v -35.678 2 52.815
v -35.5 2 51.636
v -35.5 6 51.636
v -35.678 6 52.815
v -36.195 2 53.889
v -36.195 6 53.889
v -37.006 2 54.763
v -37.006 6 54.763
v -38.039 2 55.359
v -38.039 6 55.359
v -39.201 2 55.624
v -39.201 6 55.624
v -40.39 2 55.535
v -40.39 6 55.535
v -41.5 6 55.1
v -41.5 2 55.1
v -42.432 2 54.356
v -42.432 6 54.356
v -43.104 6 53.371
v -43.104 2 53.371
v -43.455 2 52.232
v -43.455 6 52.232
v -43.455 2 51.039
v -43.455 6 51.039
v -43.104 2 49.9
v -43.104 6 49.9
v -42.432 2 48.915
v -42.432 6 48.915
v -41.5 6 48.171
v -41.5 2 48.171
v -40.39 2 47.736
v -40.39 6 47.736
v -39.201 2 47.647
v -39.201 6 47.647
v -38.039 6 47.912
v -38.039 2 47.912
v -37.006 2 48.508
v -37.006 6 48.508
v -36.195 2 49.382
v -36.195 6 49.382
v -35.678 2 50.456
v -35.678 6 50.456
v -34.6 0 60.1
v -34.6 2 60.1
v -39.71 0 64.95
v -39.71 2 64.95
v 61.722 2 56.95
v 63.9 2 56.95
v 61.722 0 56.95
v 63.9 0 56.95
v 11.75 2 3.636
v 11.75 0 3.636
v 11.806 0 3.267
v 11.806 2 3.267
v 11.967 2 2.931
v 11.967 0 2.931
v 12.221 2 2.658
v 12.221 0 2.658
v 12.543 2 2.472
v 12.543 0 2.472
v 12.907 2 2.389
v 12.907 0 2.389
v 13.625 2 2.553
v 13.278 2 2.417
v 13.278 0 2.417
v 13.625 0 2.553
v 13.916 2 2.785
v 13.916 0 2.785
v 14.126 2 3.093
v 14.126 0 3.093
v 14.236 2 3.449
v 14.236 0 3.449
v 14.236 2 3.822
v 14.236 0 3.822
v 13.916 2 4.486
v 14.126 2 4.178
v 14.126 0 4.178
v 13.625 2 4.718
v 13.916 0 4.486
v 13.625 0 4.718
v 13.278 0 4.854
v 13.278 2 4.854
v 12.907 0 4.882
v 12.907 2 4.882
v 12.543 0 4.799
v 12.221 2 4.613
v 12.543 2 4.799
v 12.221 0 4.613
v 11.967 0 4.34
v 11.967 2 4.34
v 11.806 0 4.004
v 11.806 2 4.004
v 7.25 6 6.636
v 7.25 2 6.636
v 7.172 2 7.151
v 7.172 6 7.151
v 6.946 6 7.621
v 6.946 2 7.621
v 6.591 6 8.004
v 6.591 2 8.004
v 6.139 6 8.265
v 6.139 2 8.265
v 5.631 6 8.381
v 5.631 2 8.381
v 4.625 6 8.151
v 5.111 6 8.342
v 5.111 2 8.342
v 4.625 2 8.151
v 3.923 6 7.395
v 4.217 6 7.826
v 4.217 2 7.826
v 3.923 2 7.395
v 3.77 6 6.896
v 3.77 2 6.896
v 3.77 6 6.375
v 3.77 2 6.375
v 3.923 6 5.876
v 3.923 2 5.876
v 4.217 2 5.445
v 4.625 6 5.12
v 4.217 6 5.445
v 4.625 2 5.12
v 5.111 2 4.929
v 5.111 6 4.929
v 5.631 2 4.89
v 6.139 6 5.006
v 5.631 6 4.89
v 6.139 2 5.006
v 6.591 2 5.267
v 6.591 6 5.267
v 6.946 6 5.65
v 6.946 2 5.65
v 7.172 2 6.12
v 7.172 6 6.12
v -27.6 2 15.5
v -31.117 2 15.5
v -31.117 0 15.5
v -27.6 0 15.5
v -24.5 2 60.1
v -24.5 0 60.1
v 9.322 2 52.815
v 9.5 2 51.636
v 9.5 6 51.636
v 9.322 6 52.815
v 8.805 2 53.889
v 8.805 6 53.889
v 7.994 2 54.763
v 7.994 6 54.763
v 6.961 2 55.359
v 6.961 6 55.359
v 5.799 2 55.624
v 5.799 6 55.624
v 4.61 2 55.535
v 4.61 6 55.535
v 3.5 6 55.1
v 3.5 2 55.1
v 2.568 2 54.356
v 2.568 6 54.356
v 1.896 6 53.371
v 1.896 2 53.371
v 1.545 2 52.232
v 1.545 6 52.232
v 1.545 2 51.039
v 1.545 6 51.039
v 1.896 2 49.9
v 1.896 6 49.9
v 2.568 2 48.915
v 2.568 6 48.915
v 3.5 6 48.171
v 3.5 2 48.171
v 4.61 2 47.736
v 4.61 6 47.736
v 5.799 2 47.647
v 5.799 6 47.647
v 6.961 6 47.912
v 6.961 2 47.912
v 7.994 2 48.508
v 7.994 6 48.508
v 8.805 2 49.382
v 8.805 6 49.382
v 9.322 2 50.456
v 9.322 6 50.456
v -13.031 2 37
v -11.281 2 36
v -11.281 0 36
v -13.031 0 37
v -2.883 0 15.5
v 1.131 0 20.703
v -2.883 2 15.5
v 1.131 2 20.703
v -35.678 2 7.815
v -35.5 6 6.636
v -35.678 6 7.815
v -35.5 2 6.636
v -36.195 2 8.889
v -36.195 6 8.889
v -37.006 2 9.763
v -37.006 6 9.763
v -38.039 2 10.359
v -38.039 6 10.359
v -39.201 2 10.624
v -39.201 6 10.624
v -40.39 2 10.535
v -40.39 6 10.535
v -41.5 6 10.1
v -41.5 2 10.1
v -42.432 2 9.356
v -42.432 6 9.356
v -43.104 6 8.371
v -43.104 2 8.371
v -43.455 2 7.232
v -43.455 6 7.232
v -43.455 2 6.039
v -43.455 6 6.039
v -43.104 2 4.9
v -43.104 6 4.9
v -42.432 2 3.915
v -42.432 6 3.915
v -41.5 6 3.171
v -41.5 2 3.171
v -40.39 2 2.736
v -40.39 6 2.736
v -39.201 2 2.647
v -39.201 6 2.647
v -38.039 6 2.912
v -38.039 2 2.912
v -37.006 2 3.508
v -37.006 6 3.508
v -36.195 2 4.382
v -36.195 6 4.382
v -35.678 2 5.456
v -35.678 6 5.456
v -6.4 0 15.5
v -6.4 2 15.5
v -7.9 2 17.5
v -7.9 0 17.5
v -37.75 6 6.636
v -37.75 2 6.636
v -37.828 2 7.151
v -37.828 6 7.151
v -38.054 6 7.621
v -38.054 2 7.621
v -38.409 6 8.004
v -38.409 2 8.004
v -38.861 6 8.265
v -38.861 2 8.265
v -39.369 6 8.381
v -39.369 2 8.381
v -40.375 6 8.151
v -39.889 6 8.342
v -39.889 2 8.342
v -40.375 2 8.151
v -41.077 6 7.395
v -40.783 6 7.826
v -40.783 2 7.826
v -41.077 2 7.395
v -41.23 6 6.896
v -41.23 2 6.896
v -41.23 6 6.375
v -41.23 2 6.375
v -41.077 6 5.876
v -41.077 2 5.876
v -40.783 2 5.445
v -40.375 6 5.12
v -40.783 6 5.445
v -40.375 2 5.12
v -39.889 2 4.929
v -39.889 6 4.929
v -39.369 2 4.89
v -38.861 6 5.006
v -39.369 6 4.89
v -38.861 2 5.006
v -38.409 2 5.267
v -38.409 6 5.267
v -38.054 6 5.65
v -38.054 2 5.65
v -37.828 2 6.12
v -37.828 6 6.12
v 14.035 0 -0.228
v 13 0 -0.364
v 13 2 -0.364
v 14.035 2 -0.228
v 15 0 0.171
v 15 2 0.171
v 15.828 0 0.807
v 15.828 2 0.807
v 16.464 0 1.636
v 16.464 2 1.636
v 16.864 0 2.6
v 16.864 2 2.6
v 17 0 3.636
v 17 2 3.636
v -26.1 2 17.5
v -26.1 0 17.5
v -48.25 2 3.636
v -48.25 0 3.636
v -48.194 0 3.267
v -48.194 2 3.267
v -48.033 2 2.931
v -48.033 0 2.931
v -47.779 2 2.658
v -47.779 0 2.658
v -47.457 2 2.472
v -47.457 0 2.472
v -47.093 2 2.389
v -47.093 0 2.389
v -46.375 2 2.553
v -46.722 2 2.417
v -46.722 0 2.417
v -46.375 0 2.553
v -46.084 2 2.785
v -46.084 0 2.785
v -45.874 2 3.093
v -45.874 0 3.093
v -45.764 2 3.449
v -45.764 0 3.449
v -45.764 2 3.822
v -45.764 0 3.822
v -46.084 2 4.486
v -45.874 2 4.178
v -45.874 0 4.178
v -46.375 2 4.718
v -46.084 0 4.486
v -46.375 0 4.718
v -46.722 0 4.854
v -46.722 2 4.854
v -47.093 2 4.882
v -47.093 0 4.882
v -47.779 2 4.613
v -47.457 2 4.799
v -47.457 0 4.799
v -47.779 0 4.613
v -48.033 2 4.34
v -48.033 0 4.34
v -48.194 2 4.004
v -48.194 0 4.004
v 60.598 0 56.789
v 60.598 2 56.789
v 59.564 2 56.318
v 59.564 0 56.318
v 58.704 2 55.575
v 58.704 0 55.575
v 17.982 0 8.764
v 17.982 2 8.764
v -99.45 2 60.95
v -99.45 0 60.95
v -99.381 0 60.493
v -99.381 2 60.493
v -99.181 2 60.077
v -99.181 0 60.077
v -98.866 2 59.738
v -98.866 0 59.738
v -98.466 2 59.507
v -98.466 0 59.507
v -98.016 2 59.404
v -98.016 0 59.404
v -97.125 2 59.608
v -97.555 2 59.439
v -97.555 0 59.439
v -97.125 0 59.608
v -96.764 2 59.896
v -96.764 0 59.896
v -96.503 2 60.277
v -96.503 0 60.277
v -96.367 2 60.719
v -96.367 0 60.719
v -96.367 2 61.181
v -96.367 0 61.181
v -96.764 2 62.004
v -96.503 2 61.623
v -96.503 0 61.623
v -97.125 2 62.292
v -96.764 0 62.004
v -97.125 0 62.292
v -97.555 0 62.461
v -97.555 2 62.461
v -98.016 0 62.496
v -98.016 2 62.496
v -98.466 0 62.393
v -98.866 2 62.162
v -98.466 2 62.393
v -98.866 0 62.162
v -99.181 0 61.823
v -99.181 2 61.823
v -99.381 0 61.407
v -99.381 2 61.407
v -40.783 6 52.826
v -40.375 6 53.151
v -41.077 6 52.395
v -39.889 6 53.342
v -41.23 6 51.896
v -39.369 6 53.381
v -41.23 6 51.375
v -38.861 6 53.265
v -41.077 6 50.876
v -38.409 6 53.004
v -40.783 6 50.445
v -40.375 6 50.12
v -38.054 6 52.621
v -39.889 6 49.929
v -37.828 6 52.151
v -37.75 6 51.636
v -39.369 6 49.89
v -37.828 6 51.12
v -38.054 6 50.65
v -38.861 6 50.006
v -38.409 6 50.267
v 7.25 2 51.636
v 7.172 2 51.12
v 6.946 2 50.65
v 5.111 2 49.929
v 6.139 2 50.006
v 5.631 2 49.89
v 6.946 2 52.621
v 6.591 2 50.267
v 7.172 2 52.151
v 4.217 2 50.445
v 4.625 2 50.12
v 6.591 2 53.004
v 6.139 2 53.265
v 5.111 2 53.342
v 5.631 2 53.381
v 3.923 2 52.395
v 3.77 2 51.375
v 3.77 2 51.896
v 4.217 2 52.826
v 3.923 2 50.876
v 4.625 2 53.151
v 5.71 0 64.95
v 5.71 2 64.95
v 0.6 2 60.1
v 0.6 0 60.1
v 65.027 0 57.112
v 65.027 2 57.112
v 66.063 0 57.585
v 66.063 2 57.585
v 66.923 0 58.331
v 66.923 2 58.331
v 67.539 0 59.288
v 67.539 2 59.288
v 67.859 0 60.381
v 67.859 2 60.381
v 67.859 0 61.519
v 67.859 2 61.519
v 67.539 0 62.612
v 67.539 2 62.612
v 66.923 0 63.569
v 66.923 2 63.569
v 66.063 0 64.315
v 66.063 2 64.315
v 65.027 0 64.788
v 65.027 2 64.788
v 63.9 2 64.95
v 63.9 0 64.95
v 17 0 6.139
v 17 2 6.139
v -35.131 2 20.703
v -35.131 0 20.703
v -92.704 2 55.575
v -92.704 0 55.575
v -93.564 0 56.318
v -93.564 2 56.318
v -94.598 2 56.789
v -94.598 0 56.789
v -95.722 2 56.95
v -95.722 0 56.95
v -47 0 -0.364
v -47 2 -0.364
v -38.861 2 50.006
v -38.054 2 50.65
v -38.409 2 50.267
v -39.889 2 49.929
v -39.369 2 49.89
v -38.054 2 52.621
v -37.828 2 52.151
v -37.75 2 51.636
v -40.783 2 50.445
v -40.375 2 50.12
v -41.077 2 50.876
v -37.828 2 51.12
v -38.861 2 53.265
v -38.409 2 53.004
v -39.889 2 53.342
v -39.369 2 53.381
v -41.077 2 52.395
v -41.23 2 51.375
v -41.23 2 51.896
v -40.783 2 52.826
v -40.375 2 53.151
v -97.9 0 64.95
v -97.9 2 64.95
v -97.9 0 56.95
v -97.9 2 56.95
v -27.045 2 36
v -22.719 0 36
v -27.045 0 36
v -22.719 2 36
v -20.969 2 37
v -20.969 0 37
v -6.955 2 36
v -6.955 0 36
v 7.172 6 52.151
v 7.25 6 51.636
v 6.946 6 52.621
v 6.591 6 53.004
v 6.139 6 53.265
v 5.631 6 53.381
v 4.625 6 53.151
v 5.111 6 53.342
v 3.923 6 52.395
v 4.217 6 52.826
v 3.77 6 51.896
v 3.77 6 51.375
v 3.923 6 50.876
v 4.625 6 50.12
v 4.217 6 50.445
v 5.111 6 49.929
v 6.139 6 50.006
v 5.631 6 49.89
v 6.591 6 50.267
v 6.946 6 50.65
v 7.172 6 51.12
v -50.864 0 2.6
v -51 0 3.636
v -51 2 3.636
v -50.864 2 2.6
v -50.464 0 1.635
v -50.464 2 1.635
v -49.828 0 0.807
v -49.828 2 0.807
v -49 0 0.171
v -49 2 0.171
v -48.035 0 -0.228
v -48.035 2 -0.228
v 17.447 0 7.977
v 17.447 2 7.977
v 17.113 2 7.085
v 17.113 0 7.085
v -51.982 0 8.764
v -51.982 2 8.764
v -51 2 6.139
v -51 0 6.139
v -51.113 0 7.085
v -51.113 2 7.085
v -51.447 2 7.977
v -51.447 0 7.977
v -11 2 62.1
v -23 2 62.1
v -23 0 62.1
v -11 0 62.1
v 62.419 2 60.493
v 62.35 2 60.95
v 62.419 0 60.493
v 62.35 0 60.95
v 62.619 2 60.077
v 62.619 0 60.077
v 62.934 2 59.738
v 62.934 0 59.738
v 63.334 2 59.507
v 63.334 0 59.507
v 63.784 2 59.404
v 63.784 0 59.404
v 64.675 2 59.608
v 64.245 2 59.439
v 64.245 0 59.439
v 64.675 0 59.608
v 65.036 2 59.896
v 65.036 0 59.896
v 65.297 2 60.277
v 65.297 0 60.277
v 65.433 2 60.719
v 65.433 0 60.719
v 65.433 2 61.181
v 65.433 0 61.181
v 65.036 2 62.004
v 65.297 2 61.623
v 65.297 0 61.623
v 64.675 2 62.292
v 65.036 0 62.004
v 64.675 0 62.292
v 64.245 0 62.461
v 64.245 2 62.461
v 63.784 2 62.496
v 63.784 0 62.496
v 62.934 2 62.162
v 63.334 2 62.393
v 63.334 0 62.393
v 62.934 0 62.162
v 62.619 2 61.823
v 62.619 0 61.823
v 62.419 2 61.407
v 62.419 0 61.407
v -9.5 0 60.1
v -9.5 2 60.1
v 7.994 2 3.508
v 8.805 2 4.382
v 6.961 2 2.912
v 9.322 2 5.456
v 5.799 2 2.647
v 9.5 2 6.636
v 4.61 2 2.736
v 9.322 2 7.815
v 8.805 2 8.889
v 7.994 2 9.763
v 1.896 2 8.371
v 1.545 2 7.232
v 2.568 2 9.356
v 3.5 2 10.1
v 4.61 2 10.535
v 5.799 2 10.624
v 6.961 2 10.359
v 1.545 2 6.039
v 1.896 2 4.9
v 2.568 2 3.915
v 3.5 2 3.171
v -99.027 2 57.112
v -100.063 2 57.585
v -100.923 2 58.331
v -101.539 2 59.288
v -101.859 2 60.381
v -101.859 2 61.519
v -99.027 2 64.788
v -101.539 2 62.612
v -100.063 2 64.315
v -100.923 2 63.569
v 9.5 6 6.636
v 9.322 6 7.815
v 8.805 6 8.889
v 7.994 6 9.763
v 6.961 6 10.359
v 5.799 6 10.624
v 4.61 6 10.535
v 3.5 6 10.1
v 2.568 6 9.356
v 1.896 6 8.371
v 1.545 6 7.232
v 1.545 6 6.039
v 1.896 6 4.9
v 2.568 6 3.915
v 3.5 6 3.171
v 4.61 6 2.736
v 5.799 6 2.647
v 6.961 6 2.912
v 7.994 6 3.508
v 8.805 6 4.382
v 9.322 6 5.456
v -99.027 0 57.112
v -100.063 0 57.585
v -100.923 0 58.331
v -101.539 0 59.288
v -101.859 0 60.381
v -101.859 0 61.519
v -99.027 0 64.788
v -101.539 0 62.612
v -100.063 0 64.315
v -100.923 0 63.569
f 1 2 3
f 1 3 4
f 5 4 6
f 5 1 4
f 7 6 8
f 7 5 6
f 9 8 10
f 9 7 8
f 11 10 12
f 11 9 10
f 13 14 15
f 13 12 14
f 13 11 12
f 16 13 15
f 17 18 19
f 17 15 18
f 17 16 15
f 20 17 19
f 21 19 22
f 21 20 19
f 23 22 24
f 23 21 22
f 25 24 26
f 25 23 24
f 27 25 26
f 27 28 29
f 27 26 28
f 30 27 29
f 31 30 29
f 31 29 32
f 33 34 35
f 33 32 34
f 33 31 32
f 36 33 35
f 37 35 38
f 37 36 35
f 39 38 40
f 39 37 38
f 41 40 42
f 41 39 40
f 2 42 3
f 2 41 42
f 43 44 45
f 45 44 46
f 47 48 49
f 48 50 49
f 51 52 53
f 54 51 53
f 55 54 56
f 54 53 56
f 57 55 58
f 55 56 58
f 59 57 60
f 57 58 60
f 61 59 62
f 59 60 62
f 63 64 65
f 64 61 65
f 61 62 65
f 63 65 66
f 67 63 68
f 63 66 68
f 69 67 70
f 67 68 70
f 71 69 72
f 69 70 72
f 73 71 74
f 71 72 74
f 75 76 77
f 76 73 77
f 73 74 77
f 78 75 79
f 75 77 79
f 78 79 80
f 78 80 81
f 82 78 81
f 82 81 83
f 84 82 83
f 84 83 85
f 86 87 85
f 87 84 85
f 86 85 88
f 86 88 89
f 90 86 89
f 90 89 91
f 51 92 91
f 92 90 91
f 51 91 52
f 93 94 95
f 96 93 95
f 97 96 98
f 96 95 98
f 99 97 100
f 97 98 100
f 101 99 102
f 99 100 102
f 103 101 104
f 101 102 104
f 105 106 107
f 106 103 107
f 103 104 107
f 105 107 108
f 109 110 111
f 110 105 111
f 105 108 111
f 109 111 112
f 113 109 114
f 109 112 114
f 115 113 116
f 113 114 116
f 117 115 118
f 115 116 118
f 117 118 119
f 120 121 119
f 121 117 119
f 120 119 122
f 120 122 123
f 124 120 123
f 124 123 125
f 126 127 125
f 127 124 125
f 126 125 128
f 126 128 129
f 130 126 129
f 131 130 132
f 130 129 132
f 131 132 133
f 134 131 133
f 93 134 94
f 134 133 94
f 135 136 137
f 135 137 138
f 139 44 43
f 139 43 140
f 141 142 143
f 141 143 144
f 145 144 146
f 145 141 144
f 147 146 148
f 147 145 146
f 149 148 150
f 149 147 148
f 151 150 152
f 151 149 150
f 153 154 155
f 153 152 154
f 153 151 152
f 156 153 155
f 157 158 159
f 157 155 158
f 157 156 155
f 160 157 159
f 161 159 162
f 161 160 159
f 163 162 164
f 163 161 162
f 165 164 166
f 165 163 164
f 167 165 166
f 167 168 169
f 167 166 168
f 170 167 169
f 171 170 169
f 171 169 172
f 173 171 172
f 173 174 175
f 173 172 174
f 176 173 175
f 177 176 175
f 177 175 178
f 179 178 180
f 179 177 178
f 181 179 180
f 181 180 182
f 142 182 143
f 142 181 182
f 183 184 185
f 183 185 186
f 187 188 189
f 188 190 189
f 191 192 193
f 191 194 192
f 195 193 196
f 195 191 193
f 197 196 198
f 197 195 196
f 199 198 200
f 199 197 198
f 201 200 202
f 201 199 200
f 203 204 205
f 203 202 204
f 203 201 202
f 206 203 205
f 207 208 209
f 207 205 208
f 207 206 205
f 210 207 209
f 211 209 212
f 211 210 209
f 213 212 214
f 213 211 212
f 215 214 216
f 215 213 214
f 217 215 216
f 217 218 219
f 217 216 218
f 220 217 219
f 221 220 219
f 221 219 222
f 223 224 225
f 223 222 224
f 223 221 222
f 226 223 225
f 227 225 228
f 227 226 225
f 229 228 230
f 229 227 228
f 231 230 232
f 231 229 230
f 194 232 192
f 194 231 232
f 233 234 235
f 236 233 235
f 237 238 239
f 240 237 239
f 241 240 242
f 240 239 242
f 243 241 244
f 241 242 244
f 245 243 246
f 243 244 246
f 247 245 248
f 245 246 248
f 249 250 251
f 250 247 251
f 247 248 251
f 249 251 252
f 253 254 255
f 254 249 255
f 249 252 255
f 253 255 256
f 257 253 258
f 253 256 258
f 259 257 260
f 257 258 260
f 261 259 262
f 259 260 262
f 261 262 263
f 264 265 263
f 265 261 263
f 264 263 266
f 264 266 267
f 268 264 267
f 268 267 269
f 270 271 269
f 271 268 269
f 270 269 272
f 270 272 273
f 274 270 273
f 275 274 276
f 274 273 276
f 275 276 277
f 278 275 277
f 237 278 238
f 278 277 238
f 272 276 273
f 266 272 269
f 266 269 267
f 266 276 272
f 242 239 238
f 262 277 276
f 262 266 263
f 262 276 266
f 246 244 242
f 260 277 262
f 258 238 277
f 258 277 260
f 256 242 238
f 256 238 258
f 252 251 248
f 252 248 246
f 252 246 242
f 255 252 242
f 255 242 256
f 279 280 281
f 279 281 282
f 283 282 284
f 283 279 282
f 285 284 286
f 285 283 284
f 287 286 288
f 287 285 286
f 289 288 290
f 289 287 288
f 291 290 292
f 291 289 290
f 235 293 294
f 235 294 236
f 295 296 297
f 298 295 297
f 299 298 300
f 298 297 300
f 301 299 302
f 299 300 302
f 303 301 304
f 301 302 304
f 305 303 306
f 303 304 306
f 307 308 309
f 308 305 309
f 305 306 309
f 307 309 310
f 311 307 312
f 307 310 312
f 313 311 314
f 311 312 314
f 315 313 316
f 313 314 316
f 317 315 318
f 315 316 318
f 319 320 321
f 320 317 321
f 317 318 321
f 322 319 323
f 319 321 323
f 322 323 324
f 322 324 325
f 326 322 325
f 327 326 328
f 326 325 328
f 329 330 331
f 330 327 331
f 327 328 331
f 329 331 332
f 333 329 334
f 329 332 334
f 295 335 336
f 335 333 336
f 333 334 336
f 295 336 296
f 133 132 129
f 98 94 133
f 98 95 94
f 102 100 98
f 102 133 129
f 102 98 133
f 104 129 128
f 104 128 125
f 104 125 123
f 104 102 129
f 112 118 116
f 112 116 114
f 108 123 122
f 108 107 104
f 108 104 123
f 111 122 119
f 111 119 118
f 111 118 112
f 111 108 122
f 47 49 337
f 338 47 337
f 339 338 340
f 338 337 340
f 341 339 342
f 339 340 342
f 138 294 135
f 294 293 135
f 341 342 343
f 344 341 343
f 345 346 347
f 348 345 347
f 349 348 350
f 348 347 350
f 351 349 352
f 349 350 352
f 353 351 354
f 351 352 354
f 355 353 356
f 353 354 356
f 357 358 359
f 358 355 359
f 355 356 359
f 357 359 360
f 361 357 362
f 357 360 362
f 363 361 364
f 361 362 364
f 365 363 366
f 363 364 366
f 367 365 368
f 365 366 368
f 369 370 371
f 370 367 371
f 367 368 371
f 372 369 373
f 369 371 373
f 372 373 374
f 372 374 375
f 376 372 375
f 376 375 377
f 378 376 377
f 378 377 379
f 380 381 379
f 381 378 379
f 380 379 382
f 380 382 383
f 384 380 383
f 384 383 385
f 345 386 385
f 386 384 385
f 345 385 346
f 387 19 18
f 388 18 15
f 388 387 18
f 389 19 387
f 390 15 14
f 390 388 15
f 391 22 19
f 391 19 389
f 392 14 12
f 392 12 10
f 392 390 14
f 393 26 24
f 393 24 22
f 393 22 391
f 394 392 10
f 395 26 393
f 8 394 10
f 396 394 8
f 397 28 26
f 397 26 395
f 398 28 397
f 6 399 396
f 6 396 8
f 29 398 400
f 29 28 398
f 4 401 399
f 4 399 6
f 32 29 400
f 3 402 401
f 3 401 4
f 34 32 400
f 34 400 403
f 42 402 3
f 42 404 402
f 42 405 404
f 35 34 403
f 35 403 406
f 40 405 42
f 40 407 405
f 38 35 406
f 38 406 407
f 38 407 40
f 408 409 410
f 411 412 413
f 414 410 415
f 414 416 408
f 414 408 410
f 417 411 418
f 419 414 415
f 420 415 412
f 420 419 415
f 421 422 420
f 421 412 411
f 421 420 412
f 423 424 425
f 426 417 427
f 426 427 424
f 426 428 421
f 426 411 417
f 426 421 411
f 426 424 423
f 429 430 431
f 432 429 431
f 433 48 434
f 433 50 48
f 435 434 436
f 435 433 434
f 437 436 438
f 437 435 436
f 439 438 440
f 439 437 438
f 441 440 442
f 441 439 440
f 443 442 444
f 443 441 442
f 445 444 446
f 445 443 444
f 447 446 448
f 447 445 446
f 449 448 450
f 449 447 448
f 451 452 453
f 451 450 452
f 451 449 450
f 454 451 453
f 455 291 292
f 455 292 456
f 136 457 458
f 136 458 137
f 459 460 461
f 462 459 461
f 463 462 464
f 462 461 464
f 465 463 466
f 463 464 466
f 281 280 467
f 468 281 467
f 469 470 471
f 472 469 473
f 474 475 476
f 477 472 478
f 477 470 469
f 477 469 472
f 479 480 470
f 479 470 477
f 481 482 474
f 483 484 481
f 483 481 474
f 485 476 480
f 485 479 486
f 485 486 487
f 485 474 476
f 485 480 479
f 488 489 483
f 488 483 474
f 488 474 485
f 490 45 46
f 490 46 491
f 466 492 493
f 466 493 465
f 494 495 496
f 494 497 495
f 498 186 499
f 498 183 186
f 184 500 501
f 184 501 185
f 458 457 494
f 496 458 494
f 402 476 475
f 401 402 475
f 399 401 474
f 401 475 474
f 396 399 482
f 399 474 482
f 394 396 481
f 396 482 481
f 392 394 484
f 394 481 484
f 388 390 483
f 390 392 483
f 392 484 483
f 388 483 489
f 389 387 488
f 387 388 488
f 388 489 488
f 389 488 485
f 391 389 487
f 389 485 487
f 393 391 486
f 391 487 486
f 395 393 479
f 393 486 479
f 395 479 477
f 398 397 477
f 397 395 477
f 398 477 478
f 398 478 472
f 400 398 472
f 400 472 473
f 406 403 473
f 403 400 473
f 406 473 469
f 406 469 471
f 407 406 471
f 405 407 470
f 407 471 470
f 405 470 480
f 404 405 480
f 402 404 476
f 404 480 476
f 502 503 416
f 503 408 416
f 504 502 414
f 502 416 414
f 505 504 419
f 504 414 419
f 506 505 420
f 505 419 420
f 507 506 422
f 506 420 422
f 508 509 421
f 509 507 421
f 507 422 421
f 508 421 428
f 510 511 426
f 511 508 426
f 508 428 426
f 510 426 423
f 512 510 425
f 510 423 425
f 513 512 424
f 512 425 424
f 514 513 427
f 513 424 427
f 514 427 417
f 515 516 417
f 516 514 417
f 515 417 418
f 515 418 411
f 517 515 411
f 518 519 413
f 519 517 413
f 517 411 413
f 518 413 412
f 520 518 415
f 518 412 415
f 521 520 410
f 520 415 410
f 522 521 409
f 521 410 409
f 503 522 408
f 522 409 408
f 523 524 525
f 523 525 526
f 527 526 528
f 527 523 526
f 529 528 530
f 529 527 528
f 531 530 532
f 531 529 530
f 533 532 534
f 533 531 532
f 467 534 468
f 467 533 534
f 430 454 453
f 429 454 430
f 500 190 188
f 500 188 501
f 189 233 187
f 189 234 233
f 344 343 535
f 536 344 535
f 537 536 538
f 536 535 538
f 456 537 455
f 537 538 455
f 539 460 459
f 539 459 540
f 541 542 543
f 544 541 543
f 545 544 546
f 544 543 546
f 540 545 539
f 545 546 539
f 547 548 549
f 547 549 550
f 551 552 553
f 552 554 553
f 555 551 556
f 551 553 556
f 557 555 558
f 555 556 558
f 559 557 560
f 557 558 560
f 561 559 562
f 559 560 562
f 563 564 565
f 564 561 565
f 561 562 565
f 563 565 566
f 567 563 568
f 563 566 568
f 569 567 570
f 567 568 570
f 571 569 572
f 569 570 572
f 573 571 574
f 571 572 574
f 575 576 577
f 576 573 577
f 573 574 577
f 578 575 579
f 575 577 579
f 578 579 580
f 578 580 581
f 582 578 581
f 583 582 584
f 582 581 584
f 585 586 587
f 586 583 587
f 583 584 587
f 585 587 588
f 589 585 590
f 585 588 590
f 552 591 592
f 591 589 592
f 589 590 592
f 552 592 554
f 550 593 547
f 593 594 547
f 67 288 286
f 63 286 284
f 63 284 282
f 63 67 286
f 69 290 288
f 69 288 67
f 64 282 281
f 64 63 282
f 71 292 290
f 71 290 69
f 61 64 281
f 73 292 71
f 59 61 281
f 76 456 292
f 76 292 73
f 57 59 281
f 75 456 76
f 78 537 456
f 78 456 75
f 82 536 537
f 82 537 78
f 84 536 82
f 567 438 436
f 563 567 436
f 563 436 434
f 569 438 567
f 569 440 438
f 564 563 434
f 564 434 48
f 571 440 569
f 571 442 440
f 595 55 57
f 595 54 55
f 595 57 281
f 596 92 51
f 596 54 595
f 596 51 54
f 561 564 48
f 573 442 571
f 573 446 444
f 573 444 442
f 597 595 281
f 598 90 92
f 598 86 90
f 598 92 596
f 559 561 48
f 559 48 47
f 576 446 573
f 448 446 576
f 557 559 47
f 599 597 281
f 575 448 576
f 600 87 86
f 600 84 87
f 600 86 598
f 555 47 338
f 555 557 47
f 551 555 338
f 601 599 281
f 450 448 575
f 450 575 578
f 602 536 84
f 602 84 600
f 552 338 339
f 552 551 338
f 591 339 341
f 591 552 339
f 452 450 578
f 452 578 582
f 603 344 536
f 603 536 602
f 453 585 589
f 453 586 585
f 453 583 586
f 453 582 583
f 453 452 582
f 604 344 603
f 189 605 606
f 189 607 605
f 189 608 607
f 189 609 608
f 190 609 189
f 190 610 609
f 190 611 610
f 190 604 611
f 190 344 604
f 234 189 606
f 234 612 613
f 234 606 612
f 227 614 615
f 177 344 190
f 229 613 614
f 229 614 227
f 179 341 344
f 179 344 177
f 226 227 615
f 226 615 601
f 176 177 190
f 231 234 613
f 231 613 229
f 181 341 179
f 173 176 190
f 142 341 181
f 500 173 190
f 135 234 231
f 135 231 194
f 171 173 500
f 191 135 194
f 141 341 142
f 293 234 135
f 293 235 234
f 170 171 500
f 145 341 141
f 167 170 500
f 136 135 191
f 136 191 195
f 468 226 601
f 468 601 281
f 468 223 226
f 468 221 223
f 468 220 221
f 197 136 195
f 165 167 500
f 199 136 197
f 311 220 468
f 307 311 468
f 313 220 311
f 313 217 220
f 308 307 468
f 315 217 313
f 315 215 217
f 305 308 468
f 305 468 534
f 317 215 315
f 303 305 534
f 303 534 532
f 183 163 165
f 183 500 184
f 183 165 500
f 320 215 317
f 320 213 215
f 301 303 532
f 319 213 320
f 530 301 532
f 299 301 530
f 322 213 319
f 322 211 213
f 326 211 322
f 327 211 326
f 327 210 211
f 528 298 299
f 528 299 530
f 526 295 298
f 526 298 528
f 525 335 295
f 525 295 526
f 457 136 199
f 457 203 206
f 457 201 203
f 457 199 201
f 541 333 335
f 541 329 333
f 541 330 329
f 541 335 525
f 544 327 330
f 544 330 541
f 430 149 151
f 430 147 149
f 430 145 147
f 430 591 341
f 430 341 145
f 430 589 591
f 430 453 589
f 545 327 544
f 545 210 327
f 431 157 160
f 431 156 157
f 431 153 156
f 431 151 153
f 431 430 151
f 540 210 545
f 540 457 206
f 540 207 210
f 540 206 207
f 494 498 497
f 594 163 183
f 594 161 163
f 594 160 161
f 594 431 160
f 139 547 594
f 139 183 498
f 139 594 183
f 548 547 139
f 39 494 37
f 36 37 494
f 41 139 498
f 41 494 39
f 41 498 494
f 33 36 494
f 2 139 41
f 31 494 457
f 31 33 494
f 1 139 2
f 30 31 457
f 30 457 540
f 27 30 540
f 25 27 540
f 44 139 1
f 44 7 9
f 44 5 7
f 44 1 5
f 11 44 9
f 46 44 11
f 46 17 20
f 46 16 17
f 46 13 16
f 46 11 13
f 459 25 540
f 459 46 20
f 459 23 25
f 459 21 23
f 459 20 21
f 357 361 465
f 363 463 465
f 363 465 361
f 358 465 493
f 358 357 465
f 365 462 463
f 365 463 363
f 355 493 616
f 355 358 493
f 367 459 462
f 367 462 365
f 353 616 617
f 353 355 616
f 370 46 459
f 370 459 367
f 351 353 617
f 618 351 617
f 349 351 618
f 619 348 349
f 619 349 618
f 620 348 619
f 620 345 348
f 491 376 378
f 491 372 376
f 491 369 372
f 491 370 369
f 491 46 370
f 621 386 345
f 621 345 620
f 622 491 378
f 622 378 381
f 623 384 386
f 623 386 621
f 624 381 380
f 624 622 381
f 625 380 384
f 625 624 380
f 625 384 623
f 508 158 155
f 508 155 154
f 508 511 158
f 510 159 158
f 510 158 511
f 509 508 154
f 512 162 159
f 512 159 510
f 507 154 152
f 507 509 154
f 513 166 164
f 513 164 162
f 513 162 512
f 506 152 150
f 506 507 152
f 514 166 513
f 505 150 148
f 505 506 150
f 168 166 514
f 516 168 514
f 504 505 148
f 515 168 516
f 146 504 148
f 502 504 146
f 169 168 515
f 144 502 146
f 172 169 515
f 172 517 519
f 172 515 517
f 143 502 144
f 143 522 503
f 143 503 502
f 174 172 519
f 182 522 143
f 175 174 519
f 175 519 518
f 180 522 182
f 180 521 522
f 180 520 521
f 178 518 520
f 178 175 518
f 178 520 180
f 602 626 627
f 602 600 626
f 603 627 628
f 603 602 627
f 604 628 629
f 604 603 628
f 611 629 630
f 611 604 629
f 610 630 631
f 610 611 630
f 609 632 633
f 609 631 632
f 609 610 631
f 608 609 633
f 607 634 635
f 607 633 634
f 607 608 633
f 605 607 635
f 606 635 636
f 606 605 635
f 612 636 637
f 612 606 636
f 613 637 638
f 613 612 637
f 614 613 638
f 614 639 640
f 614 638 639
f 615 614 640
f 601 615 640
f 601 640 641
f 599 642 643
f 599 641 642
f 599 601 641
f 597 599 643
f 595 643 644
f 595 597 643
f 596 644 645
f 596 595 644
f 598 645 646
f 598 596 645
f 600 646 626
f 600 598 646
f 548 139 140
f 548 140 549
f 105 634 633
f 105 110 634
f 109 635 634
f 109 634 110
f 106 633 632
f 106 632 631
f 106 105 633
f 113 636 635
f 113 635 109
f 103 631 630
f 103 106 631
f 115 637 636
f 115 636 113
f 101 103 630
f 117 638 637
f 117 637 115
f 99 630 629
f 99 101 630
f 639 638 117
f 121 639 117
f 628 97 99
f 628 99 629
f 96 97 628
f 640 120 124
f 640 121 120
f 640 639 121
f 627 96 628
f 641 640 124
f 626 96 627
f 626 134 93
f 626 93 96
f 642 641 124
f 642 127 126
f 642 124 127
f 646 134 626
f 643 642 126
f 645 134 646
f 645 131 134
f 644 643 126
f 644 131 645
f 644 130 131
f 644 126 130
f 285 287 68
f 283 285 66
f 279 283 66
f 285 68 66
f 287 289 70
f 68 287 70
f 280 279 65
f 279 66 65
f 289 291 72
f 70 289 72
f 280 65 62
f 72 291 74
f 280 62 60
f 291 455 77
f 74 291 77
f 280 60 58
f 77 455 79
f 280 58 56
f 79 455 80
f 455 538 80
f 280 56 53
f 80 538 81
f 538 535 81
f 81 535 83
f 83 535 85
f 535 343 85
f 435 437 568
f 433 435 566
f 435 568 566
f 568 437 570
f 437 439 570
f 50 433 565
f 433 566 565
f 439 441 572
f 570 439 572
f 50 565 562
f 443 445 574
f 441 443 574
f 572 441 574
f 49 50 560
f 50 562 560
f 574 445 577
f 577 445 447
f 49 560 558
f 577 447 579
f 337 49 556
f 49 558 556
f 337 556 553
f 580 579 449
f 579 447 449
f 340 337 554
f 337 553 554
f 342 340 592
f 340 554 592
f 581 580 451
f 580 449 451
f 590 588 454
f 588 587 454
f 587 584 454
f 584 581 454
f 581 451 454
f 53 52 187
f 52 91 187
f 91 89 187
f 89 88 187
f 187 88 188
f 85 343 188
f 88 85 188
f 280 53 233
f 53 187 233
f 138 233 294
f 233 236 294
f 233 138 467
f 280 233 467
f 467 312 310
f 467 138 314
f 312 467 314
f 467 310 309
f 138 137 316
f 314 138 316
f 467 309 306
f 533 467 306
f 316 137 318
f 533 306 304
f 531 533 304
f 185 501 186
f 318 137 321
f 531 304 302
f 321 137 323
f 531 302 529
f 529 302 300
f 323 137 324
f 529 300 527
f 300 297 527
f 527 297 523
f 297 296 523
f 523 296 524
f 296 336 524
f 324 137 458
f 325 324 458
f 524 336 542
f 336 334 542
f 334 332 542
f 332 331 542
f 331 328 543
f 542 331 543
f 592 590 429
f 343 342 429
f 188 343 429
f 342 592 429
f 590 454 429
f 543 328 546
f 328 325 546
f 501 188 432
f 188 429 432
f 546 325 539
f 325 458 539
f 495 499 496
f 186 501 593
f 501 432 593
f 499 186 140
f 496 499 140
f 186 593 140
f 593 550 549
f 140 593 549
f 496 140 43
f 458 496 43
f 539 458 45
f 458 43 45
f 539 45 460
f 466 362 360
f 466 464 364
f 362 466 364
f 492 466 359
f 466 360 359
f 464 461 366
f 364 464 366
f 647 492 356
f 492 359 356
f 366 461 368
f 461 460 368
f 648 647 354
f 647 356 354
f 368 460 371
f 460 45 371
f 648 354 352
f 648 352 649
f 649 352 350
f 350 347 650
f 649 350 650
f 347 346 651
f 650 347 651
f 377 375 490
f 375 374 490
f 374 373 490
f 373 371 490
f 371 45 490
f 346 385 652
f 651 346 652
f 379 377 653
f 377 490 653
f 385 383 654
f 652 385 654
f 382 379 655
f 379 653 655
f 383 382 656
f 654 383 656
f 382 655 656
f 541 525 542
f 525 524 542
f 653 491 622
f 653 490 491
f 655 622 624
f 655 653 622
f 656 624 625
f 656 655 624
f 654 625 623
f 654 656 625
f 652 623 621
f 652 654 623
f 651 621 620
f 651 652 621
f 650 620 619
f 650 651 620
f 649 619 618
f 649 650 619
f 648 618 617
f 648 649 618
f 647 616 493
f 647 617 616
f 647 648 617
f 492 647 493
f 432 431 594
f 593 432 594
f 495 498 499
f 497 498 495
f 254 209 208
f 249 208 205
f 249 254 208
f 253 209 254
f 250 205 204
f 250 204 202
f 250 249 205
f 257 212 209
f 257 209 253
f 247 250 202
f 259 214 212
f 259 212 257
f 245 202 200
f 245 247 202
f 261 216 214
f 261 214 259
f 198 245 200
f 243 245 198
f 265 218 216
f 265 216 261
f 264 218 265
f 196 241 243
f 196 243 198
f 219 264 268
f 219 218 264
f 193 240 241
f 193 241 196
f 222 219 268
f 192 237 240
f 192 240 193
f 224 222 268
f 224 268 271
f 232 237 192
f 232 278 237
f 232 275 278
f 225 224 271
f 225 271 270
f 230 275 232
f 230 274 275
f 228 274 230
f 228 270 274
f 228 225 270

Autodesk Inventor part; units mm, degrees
ref_plane "YZ Plane" through (0, 0, 0) normal (1, 0, 0) x (0, 1, 0)
ref_plane "XZ Plane" through (0, 0, 0) normal (0, 1, 0) x (-1, 0, 0)
ref_plane "XY Plane" through (0, 0, 0) normal (0, 0, 1) x (1, 0, 0)
sketch "Sketch1" plane through (0, 0, 0) normal (0, 1, 0) x (-1, 0, 0)
  circle A0 centre (-13, 3.6355) radius 1.25
  circle A1 centre (47, 3.6355) radius 1.25
  circle A2 centre (-63.9, 60.95) radius 1.55
  circle A3 centre (-63.9, 60.95) radius 1.5
  circle A4 centre (97.9, 60.95) radius 1.55
  circle A5 centre (97.9, 60.95) radius 1.5
  arc A6 (47, -0.3645) -> (51, 3.6355) centre (47, 3.6355) ccw
  arc A7 (-17, 3.6355) -> (-13, -0.3645) centre (-13, 3.6355) ccw
  arc A8 (-63.9, 64.95) -> (-63.9, 56.95) centre (-63.9, 60.95) ccw
  arc A9 (97.9, 56.95) -> (97.9, 64.95) centre (97.9, 60.95) ccw
  line L0 (-13, -0.3645) -> (47, -0.3645)
  line L1 (-63.9, 64.95) -> (97.9, 64.95)
  line L2 (-17, 3.6355) -> (-17, 6.1391)
  line L3 (51, 3.6355) -> (51, 6.1391)
  arc A10 (51, 3.6355) -> (47, -0.3645) centre (47, 3.6355) ccw construction
  arc A11 (-13, -0.3645) -> (-17, 3.6355) centre (-13, 3.6355) ccw construction
  line L4 (-63.9, 56.95) -> (-61.722, 56.95)
  line L5 (97.9, 56.95) -> (95.722, 56.95)
  line L6 (92.7041, 55.5753) -> (51.9821, 8.7645)
  line L7 (-58.7041, 55.5753) -> (-17.9821, 8.7645)
  arc A12 (-58.7041, 55.5753) -> (-61.722, 56.95) centre (-61.722, 52.95) ccw
  arc A13 (95.722, 56.95) -> (92.7041, 55.5753) centre (95.722, 52.95) ccw
  arc A14 (51.9821, 8.7645) -> (51, 6.1391) centre (55, 6.1391) ccw
  arc A15 (-17, 6.1391) -> (-17.9821, 8.7645) centre (-21, 6.1391) ccw
  arc A16 (-63.9, 56.95) -> (-63.9, 64.95) centre (-63.9, 60.95) ccw construction
  arc A17 (97.9, 64.95) -> (97.9, 56.95) centre (97.9, 60.95) ccw construction
  point P0 (0, 0)
  point P1 (17, 90.5)
  dimension "d0" = 2.5
  dimension "d1" = 2.5
  dimension "d2" = 3
  dimension "d3" = 3
  dimension "d4" = 8
  dimension "d5" = 8
  dimension "d6" = 8
  dimension "d7" = 8
  dimension "d8" = 60
  dimension "d18" = 4
extrude "Extrusion1" add sketch "Sketch1" along normal blind 2 contours L0 A7 L2 A15 L7 A12 L4 A8 L1 A9 L5 A13 L6 A14 L3 A6
sketch "Sketch2" plane through (0, 2, 0) normal (0, 1, 0) x (1, 0, 0)
  circle A0 centre (13, -3.6355) radius 1.25 projected
  circle A1 centre (-47, -3.6355) radius 1.25 projected
  circle A2 centre (-39.5, -6.6355) radius 4
  circle A3 centre (5.5, -6.6355) radius 4
  circle A4 centre (5.5, -51.6355) radius 4
  circle A5 centre (-39.5, -51.6355) radius 4
  line L0 (13, 0.3645) -> (-47, 0.3645) projected
  circle A6 centre (-39.5, -6.6355) radius 1.75
  circle A7 centre (5.5, -6.6355) radius 1.75
  circle A8 centre (5.5, -51.6355) radius 1.75
  circle A9 centre (-39.5, -51.6355) radius 1.75
  point P0 (0, 0)
  dimension "d21" = 60
  dimension "d22" = 8
  dimension "d23" = 8
  dimension "d24" = 8
  dimension "d25" = 8
  dimension "d26" = 45
  dimension "d27" = 45
  dimension "d28" = 45
  dimension "d29" = 7
  dimension "d30" = 45
  dimension "d31" = 7.5
  dimension "d32" = 3.5
  dimension "d33" = 3.5
  dimension "d34" = 3.5
  dimension "d35" = 3.5
extrude "Extrusion2" add sketch "Sketch2" along normal blind 4 contours A2 | A3 | A4 | A5
sketch "Sketch3" plane through (0, 2, 0) normal (0, 1, 0) x (1, 0, 0)
  circle A0 centre (13, -3.6355) radius 1.55 construction
  line L0 (13, -3.6355) -> (-2, 2) construction
  line L1 (-2, 2) -> (-2, 4) construction
  line L2 (-2, 2) -> (-2, 4) construction
  line L3 (-2, 4) -> (6, 6.8723) construction
  line L4 (9.8, 6.8723) -> (53.9673, -18.6277) construction
  line L5 (6, 6.8723) -> (9.8, 6.8723) construction
  line L6 (9.8, 6.8723) -> (53.9673, -18.6277) construction
  line L7 (57.4673, -24.6899) -> (57.0036, -33.6779) construction
  line L8 (53.9673, -18.6277) -> (57.4673, -24.6899) construction
  line L9 (57.4673, -24.6899) -> (57.0036, -33.6779) construction
  line L10 (75.376, -65.5) -> (80.5, -65.5) construction
  line L11 (57.0036, -33.6779) -> (75.376, -65.5) construction
  line L12 (75.376, -65.5) -> (6.5, -65.7) construction
  line L13 (6.5, -65.7) -> (6.2893, -65.5) construction
  line L14 (0.6, -60.1) -> (-9.5, -60.1)
  line L15 (-9.5, -60.1) -> (-11, -62.1)
  line L16 (-9.5, -60.1) -> (-11, -62.1)
  line L17 (-23, -62.1) -> (-11, -62.1)
  line L18 (-11, -62.1) -> (-23, -62.1)
  line L19 (-24.5, -60.1) -> (-23, -62.1)
  line L20 (-23, -62.1) -> (-24.5, -60.1)
  line L21 (-34.6, -60.1) -> (-24.5, -60.1)
  line L22 (-24.5, -60.1) -> (-34.6, -60.1)
  line L23 (-40.5, -71.9) -> (-40.5, -65.7) construction
  line L24 (-34.6, -60.1) -> (-39.7098, -64.95)
  line L25 (-114.5, -65.5) -> (-109.376, -65.5) construction
  line L26 (-40.5, -65.7) -> (-109.376, -65.5) construction
  line L27 (-109.376, -65.5) -> (-91.0036, -33.6779) construction
  line L28 (-87.9673, -18.6277) -> (-91.4673, -24.6899) construction
  line L29 (-91.0036, -33.6779) -> (-91.4673, -24.6899) construction
  line L30 (-91.4673, -24.6899) -> (-87.9673, -18.6277) construction
  line L31 (-40, 6.8723) -> (-43.8, 6.8723) construction
  line L32 (-87.9673, -18.6277) -> (-43.8, 6.8723) construction
  line L33 (-43.8, 6.8723) -> (-40, 6.8723) construction
  line L34 (-32, 4) -> (-40, 6.8723) construction
  line L35 (-40, 6.8723) -> (-32, 4) construction
  line L36 (-32, 4) -> (-32, 2) construction
  line L37 (-32, 2) -> (-2, 2) construction
  line L38 (-6.4, -15.5) -> (-2.8831, -15.5)
  line L39 (-2.8831, -15.5) -> (-6.4, -15.5)
  line L40 (-26.1, -17.5) -> (-7.9, -17.5)
  line L41 (-6.4, -15.5) -> (-7.9, -17.5)
  line L42 (-7.9, -17.5) -> (-26.1, -17.5)
  line L43 (-31.1169, -15.5) -> (-27.6, -15.5)
  line L44 (-26.1, -17.5) -> (-27.6, -15.5)
  line L45 (-35.1306, -20.7029) -> (-31.1169, -15.5)
  line L46 (-27.6, -15.5) -> (-31.1169, -15.5)
  line L47 (-31.1169, -15.5) -> (-35.1306, -20.7029)
  line L48 (-35.1306, -20.7029) -> (-27.0449, -36)
  line L49 (-22.7189, -36) -> (-27.0449, -36)
  line L50 (-27.0449, -36) -> (-22.7189, -36)
  line L51 (-20.9689, -37) -> (-22.7189, -36)
  line L52 (-22.7189, -36) -> (-20.9689, -37)
  line L53 (-13.0311, -37) -> (-20.9689, -37)
  line L54 (-20.9689, -37) -> (-13.0311, -37)
  line L55 (-11.2811, -36) -> (-13.0311, -37)
  line L56 (-13.0311, -37) -> (-11.2811, -36)
  line L57 (-6.9551, -36) -> (-11.2811, -36)
  line L58 (-11.2811, -36) -> (-6.9551, -36)
  line L59 (1.1306, -20.7029) -> (-6.9551, -36)
  line L60 (-6.9551, -36) -> (1.1306, -20.7029)
  line L61 (1.1306, -20.7029) -> (-2.8831, -15.5)
  circle A1 centre (13, -3.6355) radius 1.25 projected
  line L62 (-97.9, -64.95) -> (63.9, -64.95) projected
  line L63 (5.7098, -64.95) -> (-39.7098, -64.95)
  line L64 (5.7098, -64.95) -> (0.6, -60.1)
  point P0 (0, 0)
  point P1 (17, 90.5)
extrude "Extrusion3" cut sketch "Sketch3" against normal up to next contours L64 L62 L24 L21 L19 L17 L15 L14 | L38 L61 L59 L57 L55 L53 L51 L49 L48 L45 L43 L44 L40 L41
equation "\"d31\" = -0.5 * d26 + 0.5 * d21"
properties part number "ElectronicsMount - BoltOnStyle"
